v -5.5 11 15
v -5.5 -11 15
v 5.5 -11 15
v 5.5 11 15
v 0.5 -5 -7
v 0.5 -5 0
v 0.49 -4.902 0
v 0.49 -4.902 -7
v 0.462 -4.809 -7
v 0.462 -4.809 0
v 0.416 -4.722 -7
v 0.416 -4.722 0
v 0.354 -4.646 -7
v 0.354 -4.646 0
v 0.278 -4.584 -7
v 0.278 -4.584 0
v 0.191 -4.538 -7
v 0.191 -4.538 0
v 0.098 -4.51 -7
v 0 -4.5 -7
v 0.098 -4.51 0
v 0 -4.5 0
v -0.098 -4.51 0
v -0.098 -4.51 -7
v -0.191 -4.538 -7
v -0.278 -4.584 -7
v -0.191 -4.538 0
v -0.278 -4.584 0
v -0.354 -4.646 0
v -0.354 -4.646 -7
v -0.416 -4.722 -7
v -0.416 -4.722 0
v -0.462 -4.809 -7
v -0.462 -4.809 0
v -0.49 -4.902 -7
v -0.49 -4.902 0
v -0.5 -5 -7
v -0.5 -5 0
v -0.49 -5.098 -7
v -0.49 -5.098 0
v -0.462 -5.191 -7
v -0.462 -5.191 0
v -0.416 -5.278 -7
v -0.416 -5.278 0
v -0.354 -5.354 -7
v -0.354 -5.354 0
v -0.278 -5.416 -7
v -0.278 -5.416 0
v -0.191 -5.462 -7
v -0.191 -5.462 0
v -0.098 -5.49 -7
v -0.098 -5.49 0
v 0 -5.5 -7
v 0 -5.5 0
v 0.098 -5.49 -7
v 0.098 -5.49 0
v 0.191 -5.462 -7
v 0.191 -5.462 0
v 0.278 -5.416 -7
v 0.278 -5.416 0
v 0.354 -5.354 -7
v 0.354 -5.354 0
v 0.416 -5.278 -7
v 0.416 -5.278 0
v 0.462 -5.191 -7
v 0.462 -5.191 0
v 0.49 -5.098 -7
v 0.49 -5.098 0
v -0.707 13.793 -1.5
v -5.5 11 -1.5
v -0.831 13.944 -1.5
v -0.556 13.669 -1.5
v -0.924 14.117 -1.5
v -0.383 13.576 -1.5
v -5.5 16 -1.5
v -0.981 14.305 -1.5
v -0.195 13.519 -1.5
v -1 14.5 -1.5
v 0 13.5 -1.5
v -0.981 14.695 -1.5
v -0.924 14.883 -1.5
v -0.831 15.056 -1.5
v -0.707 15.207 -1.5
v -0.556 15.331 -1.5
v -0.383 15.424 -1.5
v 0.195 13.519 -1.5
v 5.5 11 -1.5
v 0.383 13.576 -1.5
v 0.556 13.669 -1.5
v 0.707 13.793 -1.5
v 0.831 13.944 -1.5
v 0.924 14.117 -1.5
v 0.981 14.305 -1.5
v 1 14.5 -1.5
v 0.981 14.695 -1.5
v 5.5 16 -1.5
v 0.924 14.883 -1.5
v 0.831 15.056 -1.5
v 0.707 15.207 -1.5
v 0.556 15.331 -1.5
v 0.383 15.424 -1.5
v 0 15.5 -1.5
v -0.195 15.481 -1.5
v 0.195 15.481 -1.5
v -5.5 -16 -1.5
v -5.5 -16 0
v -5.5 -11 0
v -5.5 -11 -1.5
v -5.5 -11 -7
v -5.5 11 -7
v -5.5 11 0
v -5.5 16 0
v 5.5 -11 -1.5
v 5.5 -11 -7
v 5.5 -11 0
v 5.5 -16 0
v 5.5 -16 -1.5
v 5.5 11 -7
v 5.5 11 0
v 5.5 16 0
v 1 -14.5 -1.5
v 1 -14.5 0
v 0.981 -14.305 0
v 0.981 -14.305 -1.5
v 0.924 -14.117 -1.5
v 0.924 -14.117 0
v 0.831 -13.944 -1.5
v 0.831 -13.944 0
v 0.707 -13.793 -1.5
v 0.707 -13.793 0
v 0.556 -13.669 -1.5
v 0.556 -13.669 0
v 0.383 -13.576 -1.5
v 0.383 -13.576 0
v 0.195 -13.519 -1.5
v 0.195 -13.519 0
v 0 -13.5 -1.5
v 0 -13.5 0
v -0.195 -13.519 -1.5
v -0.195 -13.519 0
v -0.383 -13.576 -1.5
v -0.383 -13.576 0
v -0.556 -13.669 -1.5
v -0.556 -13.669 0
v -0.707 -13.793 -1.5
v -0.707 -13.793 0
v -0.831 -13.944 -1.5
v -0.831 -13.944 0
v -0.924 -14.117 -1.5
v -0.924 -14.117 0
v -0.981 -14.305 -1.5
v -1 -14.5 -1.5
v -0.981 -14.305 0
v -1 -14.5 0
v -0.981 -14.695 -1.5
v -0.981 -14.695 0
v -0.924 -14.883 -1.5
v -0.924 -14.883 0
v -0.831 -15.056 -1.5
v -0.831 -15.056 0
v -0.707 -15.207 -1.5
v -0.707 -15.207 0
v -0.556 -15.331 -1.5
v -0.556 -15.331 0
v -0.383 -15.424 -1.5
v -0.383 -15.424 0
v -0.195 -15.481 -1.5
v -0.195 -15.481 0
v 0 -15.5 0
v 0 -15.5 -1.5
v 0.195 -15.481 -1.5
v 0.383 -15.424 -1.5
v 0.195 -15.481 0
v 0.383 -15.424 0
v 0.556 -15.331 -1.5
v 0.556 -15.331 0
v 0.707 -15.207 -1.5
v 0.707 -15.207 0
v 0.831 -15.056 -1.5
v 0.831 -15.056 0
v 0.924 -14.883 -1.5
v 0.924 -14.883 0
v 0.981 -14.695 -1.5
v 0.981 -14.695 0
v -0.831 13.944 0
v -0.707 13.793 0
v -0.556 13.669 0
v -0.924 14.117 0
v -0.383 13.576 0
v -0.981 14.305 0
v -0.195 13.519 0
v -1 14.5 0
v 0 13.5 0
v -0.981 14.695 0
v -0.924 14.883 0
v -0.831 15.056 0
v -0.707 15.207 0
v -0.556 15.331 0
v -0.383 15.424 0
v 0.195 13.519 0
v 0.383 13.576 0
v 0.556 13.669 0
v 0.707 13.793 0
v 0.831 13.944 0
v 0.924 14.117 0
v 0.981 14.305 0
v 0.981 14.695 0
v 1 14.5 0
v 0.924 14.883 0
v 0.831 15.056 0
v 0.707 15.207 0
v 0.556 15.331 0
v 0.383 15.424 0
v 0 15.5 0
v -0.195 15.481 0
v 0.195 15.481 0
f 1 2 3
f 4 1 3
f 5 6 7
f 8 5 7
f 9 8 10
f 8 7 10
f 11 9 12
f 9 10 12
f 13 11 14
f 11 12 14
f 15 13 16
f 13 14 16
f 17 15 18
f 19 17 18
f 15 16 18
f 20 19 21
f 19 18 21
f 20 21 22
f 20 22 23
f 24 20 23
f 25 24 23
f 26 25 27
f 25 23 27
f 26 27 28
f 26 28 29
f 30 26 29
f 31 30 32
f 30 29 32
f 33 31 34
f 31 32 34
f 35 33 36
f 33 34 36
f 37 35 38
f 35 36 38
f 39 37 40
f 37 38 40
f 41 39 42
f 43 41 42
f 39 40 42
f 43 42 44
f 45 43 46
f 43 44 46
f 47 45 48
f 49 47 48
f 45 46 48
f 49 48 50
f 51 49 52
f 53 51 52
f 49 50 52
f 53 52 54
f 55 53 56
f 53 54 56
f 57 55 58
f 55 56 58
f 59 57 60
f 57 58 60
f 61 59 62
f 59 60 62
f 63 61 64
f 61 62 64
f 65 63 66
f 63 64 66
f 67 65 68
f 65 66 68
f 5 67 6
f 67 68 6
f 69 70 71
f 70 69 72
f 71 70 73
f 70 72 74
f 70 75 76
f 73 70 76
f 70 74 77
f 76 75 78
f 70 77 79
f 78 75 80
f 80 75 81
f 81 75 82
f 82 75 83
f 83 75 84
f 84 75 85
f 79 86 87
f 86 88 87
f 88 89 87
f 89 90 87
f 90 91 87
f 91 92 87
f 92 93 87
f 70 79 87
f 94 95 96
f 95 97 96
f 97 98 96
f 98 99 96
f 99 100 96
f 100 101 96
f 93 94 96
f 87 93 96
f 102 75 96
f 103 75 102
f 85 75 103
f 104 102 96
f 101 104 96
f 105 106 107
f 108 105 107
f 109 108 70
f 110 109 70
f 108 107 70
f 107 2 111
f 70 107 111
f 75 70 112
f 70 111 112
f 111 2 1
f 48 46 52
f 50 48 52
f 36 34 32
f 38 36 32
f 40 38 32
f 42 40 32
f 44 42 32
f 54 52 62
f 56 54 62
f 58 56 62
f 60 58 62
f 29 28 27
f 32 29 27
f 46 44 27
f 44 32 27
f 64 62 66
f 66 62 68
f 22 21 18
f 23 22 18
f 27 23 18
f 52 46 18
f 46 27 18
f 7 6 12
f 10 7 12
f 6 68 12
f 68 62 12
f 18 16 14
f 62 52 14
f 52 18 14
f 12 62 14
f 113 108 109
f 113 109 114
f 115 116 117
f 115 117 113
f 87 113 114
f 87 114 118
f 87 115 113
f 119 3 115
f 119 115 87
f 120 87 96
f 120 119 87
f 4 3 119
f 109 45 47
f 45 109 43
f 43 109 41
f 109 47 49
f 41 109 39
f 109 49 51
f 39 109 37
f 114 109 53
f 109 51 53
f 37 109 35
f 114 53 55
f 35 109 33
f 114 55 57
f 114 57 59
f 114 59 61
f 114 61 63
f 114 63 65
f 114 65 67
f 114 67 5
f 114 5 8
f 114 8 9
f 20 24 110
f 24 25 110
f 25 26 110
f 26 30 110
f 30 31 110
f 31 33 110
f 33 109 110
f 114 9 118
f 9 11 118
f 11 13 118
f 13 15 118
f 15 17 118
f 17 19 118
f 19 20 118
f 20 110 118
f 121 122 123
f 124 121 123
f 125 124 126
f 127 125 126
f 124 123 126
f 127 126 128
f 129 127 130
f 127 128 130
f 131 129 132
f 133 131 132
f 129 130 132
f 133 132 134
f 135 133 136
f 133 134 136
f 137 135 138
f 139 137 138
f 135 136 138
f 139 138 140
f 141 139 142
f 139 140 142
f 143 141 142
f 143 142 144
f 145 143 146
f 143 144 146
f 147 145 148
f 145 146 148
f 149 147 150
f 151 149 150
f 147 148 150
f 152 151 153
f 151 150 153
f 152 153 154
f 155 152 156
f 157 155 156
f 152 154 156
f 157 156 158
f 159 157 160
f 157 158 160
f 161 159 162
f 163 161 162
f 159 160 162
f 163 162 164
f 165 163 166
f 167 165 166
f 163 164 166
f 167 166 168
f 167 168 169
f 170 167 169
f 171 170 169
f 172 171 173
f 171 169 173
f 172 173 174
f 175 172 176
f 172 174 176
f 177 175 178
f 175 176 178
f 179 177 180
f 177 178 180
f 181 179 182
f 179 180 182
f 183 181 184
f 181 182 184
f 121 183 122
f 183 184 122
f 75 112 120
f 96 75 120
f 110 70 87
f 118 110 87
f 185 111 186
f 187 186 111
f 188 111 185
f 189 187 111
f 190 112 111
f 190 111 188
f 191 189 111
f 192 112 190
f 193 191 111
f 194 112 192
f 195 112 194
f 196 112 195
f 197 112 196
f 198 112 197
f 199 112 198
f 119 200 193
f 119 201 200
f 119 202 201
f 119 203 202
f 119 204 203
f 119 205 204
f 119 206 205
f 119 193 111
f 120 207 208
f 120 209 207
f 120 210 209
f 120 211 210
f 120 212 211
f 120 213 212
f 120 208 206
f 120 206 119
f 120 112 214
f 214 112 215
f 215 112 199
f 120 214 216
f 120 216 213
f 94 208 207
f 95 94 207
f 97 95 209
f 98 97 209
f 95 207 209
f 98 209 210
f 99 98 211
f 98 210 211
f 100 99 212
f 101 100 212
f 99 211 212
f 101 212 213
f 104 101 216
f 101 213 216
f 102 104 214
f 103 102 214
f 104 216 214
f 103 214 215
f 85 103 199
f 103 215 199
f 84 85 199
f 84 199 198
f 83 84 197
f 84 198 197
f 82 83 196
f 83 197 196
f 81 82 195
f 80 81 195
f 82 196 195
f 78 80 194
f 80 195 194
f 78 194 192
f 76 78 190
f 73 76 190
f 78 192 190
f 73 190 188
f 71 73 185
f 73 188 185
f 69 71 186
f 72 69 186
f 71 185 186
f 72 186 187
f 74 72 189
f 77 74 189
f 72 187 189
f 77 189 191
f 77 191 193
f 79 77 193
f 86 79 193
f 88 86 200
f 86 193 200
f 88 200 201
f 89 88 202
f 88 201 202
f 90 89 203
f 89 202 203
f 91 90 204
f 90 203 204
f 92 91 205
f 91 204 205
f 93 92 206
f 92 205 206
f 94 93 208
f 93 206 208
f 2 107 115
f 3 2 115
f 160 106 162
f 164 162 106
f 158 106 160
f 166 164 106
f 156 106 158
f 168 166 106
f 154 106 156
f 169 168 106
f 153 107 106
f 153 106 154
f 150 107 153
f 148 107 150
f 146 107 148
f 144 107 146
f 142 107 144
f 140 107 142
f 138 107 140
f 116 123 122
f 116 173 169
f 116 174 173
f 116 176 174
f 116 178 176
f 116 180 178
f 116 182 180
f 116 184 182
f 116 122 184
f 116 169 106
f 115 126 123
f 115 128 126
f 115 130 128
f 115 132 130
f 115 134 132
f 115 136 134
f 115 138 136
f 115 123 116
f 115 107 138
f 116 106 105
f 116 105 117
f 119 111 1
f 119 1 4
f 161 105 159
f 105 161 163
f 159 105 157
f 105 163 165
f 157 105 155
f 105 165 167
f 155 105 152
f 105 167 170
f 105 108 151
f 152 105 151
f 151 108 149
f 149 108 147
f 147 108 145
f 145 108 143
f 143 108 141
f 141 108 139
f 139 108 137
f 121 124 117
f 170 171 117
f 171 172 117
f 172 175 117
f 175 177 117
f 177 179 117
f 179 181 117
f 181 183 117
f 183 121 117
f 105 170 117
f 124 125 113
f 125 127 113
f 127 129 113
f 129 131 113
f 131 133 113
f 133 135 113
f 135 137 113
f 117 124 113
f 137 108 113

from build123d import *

# Parameters (mm, degrees)
F0_W     = 11
F0_H     = 22
F0_R     = 0.5
F1_DEPTH = 15
F0_H_2   = 5
F0_R_2   = 1
F2_DEPTH = 1.5
F3_DEPTH = 7


with BuildPart() as f1:
    # F0 (on Top) → F1 (new body)
    with BuildSketch(Plane.XY):
        Rectangle(F0_W, F0_H)
        with Locations((0, -5)):
            Circle(F0_R, mode=Mode.SUBTRACT)
        with Locations((0, -5)):
            Circle(F0_R)
    extrude(amount=F1_DEPTH)

    # F0 (on Top) → F2 (join)
    with BuildSketch(Plane.XY):
        with Locations((0, -13.5)):
            Rectangle(F0_W, F0_H_2)
        with Locations((0, -14.5)):
            Circle(F0_R_2, mode=Mode.SUBTRACT)
        with Locations((0, 13.5)):
            Rectangle(F0_W, F0_H_2)
        with Locations((0, 14.5)):
            Circle(F0_R_2, mode=Mode.SUBTRACT)
    extrude(amount=-F2_DEPTH)

    # F0 (on Top) → F3 (join)
    with BuildSketch(Plane.XY):
        Rectangle(F0_W, F0_H)
        with Locations((0, -5)):
            Circle(F0_R, mode=Mode.SUBTRACT)
    extrude(amount=-F3_DEPTH)


solid = f1.part
